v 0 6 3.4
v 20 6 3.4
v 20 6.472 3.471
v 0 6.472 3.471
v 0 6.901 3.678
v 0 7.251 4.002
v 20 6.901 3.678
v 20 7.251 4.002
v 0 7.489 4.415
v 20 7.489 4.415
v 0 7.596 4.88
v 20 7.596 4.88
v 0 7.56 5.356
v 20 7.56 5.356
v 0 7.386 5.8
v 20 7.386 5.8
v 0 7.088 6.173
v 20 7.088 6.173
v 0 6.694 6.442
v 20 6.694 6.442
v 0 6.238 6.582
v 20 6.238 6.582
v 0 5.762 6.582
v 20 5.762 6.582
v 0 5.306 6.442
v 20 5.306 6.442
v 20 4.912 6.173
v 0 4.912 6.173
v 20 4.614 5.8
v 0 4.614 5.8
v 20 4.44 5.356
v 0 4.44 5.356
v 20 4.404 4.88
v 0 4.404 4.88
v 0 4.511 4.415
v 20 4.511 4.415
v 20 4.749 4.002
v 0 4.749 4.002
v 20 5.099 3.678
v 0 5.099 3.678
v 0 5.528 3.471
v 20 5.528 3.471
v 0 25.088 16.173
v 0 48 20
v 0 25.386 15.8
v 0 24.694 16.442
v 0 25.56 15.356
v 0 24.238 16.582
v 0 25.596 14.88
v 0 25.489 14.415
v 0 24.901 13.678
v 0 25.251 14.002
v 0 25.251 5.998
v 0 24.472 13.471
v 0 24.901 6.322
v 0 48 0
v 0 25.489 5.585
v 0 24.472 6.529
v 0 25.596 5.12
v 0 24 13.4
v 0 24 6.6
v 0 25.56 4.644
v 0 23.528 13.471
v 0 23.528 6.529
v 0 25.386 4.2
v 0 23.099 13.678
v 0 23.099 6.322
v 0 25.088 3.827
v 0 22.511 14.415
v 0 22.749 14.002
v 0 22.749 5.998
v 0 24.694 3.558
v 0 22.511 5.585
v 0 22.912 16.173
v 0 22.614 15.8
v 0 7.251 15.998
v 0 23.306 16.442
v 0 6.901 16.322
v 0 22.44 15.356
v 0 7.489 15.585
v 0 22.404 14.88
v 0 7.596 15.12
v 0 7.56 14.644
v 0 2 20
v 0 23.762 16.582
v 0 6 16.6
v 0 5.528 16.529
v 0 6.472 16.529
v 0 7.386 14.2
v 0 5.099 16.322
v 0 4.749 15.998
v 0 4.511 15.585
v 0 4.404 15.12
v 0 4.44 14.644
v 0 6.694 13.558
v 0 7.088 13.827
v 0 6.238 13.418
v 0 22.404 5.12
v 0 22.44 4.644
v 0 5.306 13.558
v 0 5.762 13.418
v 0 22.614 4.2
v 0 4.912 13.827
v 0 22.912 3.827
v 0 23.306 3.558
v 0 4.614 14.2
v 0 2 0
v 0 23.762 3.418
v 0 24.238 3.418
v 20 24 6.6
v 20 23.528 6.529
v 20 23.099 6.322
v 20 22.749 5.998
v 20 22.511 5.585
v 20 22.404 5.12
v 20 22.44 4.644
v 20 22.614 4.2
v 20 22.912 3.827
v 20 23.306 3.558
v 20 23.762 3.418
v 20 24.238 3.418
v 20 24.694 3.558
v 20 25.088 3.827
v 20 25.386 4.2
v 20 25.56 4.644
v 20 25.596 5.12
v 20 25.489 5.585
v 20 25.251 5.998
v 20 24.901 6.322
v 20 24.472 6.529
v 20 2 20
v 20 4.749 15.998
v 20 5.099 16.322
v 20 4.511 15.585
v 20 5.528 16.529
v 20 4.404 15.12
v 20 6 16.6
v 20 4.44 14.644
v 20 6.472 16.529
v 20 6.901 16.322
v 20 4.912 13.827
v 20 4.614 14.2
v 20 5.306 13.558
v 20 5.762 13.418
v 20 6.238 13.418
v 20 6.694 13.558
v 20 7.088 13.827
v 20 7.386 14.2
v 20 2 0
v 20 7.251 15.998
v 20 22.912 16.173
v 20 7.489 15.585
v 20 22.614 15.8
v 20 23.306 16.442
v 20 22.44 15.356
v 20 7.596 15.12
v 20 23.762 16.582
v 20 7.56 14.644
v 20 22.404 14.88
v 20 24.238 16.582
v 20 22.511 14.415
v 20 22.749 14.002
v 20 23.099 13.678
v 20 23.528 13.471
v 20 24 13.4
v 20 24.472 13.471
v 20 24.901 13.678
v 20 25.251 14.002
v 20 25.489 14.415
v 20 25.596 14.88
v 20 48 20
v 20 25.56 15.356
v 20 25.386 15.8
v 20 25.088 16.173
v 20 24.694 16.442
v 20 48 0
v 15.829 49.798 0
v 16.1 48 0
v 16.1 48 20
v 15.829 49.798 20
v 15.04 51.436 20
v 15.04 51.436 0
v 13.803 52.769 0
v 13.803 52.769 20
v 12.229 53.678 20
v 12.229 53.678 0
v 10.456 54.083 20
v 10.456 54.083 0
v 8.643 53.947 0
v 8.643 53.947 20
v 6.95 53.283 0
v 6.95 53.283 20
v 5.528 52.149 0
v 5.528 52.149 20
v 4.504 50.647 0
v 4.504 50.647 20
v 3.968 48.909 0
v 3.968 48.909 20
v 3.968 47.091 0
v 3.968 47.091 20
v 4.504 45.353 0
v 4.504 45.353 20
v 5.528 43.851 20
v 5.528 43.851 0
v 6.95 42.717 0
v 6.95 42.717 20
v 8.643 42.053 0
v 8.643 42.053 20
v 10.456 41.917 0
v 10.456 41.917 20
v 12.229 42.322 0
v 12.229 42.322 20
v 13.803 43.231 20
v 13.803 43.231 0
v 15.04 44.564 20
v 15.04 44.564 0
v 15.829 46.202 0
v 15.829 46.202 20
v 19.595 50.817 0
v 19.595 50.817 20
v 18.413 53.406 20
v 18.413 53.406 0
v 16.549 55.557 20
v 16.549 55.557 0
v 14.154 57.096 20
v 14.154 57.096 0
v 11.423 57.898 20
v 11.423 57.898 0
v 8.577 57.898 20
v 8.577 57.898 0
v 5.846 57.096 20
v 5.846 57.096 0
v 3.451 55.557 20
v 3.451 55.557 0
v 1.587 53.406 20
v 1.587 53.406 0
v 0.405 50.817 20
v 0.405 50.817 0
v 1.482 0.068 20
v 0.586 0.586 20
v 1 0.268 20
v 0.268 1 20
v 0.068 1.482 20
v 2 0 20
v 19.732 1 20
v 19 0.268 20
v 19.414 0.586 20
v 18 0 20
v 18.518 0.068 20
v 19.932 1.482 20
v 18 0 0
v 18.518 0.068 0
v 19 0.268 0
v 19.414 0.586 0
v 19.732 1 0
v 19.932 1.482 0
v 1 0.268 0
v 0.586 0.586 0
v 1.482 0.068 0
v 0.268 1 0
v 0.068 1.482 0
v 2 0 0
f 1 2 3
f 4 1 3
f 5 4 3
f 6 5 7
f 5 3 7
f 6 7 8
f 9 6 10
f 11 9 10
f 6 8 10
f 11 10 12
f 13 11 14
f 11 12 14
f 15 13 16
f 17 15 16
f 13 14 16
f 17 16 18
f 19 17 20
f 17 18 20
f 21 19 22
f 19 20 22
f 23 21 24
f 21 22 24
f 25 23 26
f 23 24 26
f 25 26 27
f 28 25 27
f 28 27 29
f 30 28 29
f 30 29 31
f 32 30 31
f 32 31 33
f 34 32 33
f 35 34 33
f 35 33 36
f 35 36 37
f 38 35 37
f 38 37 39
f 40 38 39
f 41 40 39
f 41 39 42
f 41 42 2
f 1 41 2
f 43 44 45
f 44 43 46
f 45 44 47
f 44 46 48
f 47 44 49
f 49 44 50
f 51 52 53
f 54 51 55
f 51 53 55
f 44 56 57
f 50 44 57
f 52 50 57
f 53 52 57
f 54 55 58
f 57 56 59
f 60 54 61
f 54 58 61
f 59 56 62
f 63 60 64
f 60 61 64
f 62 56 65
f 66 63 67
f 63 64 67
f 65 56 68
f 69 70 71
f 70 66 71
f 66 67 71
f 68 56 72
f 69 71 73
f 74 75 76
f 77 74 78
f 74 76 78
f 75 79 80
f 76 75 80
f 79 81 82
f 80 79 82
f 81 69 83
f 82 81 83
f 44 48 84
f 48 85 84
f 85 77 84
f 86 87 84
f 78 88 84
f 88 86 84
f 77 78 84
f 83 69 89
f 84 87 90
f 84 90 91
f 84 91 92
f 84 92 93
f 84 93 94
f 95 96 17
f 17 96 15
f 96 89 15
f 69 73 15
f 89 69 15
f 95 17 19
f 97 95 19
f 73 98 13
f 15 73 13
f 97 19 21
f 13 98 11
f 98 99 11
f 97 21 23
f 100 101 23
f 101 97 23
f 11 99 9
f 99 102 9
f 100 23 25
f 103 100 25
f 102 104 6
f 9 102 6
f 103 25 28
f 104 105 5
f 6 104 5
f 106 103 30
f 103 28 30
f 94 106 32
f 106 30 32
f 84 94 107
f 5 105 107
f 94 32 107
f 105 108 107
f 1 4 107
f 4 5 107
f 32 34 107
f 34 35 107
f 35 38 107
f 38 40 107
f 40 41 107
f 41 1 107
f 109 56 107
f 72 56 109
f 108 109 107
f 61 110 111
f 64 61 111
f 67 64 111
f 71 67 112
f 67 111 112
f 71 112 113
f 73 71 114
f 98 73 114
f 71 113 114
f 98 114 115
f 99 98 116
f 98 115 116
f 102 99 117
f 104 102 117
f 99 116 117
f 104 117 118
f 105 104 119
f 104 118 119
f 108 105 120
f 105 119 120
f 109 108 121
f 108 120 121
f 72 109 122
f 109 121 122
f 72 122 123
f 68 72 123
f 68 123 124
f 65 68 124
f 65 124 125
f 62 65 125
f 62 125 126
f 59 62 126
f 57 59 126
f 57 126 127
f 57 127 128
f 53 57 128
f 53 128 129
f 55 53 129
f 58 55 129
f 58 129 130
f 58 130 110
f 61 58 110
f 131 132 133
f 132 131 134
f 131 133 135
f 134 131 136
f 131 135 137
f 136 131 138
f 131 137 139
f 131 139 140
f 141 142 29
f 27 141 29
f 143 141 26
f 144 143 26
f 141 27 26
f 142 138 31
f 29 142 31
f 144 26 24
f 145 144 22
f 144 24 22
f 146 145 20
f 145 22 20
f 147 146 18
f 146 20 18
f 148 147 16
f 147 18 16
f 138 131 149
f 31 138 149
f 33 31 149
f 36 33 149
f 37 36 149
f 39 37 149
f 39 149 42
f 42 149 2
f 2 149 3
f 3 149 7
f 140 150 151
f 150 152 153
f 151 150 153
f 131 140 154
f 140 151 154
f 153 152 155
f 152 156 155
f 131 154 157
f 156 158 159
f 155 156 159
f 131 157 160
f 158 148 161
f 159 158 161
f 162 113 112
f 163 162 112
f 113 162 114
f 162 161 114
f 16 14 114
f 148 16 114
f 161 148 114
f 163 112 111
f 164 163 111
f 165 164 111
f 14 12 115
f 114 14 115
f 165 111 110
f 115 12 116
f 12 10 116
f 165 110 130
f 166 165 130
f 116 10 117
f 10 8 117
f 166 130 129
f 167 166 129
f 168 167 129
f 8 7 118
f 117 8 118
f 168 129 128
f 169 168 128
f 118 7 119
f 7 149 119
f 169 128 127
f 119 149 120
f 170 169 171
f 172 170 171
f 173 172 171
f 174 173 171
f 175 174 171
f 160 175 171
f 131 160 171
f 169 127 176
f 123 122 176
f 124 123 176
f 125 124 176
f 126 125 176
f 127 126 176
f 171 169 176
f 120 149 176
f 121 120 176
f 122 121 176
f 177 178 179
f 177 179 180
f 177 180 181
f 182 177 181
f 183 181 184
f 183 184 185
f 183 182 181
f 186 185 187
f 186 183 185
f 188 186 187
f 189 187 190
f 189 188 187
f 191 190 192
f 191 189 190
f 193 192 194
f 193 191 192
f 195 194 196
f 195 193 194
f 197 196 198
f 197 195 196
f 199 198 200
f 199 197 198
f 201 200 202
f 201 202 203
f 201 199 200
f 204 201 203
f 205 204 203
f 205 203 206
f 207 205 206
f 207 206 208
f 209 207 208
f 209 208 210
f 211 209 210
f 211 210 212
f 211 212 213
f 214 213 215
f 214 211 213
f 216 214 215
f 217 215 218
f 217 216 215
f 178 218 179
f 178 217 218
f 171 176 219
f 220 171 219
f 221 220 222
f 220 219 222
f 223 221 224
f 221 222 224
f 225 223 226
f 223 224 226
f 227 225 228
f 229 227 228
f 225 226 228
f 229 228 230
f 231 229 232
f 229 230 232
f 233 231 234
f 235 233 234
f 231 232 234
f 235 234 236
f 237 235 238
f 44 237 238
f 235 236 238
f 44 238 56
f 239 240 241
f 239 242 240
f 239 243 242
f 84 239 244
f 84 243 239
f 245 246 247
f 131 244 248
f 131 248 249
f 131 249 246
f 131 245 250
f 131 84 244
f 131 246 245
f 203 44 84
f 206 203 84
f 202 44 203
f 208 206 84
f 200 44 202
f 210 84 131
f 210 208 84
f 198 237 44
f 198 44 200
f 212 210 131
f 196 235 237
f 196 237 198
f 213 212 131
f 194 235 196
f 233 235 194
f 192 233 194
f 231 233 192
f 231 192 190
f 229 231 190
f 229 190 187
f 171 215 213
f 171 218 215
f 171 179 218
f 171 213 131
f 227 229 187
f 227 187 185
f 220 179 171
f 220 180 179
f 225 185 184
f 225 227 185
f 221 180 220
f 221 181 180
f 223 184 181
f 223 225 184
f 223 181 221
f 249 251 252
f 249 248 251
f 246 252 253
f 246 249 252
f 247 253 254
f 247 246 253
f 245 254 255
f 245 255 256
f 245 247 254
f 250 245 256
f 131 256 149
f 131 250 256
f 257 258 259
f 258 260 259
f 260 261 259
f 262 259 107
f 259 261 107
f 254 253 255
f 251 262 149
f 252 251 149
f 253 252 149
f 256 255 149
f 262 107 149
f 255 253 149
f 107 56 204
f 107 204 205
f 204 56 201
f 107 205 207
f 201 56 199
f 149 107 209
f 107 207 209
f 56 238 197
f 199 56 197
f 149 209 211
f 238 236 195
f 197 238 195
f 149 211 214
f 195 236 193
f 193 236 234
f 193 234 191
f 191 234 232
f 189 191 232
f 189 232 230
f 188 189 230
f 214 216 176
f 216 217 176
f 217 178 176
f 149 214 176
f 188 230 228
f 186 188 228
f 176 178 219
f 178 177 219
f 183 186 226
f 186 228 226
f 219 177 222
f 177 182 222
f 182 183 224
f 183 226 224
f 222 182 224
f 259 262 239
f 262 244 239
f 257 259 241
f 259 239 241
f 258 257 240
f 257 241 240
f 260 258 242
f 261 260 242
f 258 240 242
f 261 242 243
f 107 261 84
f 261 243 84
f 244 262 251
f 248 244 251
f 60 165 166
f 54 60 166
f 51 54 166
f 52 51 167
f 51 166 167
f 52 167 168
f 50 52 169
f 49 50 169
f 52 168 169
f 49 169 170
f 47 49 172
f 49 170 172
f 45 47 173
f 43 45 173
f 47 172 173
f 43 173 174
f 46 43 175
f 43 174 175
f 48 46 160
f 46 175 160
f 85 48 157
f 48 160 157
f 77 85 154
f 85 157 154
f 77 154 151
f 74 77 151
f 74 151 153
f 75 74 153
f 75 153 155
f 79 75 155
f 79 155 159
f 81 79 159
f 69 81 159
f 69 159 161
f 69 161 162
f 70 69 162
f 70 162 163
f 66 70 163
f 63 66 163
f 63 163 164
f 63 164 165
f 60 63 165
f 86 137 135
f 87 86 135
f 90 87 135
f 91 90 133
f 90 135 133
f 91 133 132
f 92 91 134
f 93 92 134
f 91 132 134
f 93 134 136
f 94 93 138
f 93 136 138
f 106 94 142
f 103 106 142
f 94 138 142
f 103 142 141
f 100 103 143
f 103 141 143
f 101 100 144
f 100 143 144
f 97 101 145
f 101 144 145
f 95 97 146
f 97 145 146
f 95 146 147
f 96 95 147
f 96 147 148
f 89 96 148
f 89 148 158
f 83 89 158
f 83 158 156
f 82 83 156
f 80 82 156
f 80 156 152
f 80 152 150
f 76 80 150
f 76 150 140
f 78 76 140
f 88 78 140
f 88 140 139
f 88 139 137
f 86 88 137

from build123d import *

# Parameters (mm, degrees)
SKETCH_1_R          = 6.1
EXTRUDE_1_DEPTH     = 20
SKETCH_2_R          = 1.6
CUT_EXTRUDE_1_DEPTH = 65.52906322
FILLET_1_R          = 2


with BuildPart() as part:
    # 草图1 → 凸台-拉伸1 (new body)
    with BuildSketch(Plane.XY):
        with BuildLine():
            Line((0, 0), (20, 0))
            Line((20, 0), (20, 30))
            Line((20, 30), (20, 48))
            ThreePointArc((20, 48), (10, 58), (0, 48))
            Line((0, 48), (0, 30))
            Line((0, 30), (0, 0))
        make_face()
        with Locations((10, 48)):
            Circle(SKETCH_1_R, mode=Mode.SUBTRACT)
    extrude(amount=EXTRUDE_1_DEPTH)

    # 草图2 → 切除-拉伸1 (cut, through all)
    with BuildSketch(Plane(origin=(20, 0, 0), x_dir=(0, 0, -1), z_dir=(1, 0, 0))):
        with Locations((-15, 24)):
            Circle(SKETCH_2_R)
        with Locations(Location((-15, 6, 0), (0, 0, 180))):
            Circle(SKETCH_2_R)
        with Locations((-5, 6)):
            Circle(SKETCH_2_R)
        with Locations(Location((-5, 24, 0), (0, 0, 180))):
            Circle(SKETCH_2_R)
    extrude(amount=-CUT_EXTRUDE_1_DEPTH, mode=Mode.SUBTRACT)

    # 圆角1
    fillet_1_edges = [part.edges().sort_by_distance(p)[0] for p in [
        (20, 0, 10),
        (0, 0, 10),
    ]]
    fillet(fillet_1_edges, radius=FILLET_1_R)


solid = part.part
